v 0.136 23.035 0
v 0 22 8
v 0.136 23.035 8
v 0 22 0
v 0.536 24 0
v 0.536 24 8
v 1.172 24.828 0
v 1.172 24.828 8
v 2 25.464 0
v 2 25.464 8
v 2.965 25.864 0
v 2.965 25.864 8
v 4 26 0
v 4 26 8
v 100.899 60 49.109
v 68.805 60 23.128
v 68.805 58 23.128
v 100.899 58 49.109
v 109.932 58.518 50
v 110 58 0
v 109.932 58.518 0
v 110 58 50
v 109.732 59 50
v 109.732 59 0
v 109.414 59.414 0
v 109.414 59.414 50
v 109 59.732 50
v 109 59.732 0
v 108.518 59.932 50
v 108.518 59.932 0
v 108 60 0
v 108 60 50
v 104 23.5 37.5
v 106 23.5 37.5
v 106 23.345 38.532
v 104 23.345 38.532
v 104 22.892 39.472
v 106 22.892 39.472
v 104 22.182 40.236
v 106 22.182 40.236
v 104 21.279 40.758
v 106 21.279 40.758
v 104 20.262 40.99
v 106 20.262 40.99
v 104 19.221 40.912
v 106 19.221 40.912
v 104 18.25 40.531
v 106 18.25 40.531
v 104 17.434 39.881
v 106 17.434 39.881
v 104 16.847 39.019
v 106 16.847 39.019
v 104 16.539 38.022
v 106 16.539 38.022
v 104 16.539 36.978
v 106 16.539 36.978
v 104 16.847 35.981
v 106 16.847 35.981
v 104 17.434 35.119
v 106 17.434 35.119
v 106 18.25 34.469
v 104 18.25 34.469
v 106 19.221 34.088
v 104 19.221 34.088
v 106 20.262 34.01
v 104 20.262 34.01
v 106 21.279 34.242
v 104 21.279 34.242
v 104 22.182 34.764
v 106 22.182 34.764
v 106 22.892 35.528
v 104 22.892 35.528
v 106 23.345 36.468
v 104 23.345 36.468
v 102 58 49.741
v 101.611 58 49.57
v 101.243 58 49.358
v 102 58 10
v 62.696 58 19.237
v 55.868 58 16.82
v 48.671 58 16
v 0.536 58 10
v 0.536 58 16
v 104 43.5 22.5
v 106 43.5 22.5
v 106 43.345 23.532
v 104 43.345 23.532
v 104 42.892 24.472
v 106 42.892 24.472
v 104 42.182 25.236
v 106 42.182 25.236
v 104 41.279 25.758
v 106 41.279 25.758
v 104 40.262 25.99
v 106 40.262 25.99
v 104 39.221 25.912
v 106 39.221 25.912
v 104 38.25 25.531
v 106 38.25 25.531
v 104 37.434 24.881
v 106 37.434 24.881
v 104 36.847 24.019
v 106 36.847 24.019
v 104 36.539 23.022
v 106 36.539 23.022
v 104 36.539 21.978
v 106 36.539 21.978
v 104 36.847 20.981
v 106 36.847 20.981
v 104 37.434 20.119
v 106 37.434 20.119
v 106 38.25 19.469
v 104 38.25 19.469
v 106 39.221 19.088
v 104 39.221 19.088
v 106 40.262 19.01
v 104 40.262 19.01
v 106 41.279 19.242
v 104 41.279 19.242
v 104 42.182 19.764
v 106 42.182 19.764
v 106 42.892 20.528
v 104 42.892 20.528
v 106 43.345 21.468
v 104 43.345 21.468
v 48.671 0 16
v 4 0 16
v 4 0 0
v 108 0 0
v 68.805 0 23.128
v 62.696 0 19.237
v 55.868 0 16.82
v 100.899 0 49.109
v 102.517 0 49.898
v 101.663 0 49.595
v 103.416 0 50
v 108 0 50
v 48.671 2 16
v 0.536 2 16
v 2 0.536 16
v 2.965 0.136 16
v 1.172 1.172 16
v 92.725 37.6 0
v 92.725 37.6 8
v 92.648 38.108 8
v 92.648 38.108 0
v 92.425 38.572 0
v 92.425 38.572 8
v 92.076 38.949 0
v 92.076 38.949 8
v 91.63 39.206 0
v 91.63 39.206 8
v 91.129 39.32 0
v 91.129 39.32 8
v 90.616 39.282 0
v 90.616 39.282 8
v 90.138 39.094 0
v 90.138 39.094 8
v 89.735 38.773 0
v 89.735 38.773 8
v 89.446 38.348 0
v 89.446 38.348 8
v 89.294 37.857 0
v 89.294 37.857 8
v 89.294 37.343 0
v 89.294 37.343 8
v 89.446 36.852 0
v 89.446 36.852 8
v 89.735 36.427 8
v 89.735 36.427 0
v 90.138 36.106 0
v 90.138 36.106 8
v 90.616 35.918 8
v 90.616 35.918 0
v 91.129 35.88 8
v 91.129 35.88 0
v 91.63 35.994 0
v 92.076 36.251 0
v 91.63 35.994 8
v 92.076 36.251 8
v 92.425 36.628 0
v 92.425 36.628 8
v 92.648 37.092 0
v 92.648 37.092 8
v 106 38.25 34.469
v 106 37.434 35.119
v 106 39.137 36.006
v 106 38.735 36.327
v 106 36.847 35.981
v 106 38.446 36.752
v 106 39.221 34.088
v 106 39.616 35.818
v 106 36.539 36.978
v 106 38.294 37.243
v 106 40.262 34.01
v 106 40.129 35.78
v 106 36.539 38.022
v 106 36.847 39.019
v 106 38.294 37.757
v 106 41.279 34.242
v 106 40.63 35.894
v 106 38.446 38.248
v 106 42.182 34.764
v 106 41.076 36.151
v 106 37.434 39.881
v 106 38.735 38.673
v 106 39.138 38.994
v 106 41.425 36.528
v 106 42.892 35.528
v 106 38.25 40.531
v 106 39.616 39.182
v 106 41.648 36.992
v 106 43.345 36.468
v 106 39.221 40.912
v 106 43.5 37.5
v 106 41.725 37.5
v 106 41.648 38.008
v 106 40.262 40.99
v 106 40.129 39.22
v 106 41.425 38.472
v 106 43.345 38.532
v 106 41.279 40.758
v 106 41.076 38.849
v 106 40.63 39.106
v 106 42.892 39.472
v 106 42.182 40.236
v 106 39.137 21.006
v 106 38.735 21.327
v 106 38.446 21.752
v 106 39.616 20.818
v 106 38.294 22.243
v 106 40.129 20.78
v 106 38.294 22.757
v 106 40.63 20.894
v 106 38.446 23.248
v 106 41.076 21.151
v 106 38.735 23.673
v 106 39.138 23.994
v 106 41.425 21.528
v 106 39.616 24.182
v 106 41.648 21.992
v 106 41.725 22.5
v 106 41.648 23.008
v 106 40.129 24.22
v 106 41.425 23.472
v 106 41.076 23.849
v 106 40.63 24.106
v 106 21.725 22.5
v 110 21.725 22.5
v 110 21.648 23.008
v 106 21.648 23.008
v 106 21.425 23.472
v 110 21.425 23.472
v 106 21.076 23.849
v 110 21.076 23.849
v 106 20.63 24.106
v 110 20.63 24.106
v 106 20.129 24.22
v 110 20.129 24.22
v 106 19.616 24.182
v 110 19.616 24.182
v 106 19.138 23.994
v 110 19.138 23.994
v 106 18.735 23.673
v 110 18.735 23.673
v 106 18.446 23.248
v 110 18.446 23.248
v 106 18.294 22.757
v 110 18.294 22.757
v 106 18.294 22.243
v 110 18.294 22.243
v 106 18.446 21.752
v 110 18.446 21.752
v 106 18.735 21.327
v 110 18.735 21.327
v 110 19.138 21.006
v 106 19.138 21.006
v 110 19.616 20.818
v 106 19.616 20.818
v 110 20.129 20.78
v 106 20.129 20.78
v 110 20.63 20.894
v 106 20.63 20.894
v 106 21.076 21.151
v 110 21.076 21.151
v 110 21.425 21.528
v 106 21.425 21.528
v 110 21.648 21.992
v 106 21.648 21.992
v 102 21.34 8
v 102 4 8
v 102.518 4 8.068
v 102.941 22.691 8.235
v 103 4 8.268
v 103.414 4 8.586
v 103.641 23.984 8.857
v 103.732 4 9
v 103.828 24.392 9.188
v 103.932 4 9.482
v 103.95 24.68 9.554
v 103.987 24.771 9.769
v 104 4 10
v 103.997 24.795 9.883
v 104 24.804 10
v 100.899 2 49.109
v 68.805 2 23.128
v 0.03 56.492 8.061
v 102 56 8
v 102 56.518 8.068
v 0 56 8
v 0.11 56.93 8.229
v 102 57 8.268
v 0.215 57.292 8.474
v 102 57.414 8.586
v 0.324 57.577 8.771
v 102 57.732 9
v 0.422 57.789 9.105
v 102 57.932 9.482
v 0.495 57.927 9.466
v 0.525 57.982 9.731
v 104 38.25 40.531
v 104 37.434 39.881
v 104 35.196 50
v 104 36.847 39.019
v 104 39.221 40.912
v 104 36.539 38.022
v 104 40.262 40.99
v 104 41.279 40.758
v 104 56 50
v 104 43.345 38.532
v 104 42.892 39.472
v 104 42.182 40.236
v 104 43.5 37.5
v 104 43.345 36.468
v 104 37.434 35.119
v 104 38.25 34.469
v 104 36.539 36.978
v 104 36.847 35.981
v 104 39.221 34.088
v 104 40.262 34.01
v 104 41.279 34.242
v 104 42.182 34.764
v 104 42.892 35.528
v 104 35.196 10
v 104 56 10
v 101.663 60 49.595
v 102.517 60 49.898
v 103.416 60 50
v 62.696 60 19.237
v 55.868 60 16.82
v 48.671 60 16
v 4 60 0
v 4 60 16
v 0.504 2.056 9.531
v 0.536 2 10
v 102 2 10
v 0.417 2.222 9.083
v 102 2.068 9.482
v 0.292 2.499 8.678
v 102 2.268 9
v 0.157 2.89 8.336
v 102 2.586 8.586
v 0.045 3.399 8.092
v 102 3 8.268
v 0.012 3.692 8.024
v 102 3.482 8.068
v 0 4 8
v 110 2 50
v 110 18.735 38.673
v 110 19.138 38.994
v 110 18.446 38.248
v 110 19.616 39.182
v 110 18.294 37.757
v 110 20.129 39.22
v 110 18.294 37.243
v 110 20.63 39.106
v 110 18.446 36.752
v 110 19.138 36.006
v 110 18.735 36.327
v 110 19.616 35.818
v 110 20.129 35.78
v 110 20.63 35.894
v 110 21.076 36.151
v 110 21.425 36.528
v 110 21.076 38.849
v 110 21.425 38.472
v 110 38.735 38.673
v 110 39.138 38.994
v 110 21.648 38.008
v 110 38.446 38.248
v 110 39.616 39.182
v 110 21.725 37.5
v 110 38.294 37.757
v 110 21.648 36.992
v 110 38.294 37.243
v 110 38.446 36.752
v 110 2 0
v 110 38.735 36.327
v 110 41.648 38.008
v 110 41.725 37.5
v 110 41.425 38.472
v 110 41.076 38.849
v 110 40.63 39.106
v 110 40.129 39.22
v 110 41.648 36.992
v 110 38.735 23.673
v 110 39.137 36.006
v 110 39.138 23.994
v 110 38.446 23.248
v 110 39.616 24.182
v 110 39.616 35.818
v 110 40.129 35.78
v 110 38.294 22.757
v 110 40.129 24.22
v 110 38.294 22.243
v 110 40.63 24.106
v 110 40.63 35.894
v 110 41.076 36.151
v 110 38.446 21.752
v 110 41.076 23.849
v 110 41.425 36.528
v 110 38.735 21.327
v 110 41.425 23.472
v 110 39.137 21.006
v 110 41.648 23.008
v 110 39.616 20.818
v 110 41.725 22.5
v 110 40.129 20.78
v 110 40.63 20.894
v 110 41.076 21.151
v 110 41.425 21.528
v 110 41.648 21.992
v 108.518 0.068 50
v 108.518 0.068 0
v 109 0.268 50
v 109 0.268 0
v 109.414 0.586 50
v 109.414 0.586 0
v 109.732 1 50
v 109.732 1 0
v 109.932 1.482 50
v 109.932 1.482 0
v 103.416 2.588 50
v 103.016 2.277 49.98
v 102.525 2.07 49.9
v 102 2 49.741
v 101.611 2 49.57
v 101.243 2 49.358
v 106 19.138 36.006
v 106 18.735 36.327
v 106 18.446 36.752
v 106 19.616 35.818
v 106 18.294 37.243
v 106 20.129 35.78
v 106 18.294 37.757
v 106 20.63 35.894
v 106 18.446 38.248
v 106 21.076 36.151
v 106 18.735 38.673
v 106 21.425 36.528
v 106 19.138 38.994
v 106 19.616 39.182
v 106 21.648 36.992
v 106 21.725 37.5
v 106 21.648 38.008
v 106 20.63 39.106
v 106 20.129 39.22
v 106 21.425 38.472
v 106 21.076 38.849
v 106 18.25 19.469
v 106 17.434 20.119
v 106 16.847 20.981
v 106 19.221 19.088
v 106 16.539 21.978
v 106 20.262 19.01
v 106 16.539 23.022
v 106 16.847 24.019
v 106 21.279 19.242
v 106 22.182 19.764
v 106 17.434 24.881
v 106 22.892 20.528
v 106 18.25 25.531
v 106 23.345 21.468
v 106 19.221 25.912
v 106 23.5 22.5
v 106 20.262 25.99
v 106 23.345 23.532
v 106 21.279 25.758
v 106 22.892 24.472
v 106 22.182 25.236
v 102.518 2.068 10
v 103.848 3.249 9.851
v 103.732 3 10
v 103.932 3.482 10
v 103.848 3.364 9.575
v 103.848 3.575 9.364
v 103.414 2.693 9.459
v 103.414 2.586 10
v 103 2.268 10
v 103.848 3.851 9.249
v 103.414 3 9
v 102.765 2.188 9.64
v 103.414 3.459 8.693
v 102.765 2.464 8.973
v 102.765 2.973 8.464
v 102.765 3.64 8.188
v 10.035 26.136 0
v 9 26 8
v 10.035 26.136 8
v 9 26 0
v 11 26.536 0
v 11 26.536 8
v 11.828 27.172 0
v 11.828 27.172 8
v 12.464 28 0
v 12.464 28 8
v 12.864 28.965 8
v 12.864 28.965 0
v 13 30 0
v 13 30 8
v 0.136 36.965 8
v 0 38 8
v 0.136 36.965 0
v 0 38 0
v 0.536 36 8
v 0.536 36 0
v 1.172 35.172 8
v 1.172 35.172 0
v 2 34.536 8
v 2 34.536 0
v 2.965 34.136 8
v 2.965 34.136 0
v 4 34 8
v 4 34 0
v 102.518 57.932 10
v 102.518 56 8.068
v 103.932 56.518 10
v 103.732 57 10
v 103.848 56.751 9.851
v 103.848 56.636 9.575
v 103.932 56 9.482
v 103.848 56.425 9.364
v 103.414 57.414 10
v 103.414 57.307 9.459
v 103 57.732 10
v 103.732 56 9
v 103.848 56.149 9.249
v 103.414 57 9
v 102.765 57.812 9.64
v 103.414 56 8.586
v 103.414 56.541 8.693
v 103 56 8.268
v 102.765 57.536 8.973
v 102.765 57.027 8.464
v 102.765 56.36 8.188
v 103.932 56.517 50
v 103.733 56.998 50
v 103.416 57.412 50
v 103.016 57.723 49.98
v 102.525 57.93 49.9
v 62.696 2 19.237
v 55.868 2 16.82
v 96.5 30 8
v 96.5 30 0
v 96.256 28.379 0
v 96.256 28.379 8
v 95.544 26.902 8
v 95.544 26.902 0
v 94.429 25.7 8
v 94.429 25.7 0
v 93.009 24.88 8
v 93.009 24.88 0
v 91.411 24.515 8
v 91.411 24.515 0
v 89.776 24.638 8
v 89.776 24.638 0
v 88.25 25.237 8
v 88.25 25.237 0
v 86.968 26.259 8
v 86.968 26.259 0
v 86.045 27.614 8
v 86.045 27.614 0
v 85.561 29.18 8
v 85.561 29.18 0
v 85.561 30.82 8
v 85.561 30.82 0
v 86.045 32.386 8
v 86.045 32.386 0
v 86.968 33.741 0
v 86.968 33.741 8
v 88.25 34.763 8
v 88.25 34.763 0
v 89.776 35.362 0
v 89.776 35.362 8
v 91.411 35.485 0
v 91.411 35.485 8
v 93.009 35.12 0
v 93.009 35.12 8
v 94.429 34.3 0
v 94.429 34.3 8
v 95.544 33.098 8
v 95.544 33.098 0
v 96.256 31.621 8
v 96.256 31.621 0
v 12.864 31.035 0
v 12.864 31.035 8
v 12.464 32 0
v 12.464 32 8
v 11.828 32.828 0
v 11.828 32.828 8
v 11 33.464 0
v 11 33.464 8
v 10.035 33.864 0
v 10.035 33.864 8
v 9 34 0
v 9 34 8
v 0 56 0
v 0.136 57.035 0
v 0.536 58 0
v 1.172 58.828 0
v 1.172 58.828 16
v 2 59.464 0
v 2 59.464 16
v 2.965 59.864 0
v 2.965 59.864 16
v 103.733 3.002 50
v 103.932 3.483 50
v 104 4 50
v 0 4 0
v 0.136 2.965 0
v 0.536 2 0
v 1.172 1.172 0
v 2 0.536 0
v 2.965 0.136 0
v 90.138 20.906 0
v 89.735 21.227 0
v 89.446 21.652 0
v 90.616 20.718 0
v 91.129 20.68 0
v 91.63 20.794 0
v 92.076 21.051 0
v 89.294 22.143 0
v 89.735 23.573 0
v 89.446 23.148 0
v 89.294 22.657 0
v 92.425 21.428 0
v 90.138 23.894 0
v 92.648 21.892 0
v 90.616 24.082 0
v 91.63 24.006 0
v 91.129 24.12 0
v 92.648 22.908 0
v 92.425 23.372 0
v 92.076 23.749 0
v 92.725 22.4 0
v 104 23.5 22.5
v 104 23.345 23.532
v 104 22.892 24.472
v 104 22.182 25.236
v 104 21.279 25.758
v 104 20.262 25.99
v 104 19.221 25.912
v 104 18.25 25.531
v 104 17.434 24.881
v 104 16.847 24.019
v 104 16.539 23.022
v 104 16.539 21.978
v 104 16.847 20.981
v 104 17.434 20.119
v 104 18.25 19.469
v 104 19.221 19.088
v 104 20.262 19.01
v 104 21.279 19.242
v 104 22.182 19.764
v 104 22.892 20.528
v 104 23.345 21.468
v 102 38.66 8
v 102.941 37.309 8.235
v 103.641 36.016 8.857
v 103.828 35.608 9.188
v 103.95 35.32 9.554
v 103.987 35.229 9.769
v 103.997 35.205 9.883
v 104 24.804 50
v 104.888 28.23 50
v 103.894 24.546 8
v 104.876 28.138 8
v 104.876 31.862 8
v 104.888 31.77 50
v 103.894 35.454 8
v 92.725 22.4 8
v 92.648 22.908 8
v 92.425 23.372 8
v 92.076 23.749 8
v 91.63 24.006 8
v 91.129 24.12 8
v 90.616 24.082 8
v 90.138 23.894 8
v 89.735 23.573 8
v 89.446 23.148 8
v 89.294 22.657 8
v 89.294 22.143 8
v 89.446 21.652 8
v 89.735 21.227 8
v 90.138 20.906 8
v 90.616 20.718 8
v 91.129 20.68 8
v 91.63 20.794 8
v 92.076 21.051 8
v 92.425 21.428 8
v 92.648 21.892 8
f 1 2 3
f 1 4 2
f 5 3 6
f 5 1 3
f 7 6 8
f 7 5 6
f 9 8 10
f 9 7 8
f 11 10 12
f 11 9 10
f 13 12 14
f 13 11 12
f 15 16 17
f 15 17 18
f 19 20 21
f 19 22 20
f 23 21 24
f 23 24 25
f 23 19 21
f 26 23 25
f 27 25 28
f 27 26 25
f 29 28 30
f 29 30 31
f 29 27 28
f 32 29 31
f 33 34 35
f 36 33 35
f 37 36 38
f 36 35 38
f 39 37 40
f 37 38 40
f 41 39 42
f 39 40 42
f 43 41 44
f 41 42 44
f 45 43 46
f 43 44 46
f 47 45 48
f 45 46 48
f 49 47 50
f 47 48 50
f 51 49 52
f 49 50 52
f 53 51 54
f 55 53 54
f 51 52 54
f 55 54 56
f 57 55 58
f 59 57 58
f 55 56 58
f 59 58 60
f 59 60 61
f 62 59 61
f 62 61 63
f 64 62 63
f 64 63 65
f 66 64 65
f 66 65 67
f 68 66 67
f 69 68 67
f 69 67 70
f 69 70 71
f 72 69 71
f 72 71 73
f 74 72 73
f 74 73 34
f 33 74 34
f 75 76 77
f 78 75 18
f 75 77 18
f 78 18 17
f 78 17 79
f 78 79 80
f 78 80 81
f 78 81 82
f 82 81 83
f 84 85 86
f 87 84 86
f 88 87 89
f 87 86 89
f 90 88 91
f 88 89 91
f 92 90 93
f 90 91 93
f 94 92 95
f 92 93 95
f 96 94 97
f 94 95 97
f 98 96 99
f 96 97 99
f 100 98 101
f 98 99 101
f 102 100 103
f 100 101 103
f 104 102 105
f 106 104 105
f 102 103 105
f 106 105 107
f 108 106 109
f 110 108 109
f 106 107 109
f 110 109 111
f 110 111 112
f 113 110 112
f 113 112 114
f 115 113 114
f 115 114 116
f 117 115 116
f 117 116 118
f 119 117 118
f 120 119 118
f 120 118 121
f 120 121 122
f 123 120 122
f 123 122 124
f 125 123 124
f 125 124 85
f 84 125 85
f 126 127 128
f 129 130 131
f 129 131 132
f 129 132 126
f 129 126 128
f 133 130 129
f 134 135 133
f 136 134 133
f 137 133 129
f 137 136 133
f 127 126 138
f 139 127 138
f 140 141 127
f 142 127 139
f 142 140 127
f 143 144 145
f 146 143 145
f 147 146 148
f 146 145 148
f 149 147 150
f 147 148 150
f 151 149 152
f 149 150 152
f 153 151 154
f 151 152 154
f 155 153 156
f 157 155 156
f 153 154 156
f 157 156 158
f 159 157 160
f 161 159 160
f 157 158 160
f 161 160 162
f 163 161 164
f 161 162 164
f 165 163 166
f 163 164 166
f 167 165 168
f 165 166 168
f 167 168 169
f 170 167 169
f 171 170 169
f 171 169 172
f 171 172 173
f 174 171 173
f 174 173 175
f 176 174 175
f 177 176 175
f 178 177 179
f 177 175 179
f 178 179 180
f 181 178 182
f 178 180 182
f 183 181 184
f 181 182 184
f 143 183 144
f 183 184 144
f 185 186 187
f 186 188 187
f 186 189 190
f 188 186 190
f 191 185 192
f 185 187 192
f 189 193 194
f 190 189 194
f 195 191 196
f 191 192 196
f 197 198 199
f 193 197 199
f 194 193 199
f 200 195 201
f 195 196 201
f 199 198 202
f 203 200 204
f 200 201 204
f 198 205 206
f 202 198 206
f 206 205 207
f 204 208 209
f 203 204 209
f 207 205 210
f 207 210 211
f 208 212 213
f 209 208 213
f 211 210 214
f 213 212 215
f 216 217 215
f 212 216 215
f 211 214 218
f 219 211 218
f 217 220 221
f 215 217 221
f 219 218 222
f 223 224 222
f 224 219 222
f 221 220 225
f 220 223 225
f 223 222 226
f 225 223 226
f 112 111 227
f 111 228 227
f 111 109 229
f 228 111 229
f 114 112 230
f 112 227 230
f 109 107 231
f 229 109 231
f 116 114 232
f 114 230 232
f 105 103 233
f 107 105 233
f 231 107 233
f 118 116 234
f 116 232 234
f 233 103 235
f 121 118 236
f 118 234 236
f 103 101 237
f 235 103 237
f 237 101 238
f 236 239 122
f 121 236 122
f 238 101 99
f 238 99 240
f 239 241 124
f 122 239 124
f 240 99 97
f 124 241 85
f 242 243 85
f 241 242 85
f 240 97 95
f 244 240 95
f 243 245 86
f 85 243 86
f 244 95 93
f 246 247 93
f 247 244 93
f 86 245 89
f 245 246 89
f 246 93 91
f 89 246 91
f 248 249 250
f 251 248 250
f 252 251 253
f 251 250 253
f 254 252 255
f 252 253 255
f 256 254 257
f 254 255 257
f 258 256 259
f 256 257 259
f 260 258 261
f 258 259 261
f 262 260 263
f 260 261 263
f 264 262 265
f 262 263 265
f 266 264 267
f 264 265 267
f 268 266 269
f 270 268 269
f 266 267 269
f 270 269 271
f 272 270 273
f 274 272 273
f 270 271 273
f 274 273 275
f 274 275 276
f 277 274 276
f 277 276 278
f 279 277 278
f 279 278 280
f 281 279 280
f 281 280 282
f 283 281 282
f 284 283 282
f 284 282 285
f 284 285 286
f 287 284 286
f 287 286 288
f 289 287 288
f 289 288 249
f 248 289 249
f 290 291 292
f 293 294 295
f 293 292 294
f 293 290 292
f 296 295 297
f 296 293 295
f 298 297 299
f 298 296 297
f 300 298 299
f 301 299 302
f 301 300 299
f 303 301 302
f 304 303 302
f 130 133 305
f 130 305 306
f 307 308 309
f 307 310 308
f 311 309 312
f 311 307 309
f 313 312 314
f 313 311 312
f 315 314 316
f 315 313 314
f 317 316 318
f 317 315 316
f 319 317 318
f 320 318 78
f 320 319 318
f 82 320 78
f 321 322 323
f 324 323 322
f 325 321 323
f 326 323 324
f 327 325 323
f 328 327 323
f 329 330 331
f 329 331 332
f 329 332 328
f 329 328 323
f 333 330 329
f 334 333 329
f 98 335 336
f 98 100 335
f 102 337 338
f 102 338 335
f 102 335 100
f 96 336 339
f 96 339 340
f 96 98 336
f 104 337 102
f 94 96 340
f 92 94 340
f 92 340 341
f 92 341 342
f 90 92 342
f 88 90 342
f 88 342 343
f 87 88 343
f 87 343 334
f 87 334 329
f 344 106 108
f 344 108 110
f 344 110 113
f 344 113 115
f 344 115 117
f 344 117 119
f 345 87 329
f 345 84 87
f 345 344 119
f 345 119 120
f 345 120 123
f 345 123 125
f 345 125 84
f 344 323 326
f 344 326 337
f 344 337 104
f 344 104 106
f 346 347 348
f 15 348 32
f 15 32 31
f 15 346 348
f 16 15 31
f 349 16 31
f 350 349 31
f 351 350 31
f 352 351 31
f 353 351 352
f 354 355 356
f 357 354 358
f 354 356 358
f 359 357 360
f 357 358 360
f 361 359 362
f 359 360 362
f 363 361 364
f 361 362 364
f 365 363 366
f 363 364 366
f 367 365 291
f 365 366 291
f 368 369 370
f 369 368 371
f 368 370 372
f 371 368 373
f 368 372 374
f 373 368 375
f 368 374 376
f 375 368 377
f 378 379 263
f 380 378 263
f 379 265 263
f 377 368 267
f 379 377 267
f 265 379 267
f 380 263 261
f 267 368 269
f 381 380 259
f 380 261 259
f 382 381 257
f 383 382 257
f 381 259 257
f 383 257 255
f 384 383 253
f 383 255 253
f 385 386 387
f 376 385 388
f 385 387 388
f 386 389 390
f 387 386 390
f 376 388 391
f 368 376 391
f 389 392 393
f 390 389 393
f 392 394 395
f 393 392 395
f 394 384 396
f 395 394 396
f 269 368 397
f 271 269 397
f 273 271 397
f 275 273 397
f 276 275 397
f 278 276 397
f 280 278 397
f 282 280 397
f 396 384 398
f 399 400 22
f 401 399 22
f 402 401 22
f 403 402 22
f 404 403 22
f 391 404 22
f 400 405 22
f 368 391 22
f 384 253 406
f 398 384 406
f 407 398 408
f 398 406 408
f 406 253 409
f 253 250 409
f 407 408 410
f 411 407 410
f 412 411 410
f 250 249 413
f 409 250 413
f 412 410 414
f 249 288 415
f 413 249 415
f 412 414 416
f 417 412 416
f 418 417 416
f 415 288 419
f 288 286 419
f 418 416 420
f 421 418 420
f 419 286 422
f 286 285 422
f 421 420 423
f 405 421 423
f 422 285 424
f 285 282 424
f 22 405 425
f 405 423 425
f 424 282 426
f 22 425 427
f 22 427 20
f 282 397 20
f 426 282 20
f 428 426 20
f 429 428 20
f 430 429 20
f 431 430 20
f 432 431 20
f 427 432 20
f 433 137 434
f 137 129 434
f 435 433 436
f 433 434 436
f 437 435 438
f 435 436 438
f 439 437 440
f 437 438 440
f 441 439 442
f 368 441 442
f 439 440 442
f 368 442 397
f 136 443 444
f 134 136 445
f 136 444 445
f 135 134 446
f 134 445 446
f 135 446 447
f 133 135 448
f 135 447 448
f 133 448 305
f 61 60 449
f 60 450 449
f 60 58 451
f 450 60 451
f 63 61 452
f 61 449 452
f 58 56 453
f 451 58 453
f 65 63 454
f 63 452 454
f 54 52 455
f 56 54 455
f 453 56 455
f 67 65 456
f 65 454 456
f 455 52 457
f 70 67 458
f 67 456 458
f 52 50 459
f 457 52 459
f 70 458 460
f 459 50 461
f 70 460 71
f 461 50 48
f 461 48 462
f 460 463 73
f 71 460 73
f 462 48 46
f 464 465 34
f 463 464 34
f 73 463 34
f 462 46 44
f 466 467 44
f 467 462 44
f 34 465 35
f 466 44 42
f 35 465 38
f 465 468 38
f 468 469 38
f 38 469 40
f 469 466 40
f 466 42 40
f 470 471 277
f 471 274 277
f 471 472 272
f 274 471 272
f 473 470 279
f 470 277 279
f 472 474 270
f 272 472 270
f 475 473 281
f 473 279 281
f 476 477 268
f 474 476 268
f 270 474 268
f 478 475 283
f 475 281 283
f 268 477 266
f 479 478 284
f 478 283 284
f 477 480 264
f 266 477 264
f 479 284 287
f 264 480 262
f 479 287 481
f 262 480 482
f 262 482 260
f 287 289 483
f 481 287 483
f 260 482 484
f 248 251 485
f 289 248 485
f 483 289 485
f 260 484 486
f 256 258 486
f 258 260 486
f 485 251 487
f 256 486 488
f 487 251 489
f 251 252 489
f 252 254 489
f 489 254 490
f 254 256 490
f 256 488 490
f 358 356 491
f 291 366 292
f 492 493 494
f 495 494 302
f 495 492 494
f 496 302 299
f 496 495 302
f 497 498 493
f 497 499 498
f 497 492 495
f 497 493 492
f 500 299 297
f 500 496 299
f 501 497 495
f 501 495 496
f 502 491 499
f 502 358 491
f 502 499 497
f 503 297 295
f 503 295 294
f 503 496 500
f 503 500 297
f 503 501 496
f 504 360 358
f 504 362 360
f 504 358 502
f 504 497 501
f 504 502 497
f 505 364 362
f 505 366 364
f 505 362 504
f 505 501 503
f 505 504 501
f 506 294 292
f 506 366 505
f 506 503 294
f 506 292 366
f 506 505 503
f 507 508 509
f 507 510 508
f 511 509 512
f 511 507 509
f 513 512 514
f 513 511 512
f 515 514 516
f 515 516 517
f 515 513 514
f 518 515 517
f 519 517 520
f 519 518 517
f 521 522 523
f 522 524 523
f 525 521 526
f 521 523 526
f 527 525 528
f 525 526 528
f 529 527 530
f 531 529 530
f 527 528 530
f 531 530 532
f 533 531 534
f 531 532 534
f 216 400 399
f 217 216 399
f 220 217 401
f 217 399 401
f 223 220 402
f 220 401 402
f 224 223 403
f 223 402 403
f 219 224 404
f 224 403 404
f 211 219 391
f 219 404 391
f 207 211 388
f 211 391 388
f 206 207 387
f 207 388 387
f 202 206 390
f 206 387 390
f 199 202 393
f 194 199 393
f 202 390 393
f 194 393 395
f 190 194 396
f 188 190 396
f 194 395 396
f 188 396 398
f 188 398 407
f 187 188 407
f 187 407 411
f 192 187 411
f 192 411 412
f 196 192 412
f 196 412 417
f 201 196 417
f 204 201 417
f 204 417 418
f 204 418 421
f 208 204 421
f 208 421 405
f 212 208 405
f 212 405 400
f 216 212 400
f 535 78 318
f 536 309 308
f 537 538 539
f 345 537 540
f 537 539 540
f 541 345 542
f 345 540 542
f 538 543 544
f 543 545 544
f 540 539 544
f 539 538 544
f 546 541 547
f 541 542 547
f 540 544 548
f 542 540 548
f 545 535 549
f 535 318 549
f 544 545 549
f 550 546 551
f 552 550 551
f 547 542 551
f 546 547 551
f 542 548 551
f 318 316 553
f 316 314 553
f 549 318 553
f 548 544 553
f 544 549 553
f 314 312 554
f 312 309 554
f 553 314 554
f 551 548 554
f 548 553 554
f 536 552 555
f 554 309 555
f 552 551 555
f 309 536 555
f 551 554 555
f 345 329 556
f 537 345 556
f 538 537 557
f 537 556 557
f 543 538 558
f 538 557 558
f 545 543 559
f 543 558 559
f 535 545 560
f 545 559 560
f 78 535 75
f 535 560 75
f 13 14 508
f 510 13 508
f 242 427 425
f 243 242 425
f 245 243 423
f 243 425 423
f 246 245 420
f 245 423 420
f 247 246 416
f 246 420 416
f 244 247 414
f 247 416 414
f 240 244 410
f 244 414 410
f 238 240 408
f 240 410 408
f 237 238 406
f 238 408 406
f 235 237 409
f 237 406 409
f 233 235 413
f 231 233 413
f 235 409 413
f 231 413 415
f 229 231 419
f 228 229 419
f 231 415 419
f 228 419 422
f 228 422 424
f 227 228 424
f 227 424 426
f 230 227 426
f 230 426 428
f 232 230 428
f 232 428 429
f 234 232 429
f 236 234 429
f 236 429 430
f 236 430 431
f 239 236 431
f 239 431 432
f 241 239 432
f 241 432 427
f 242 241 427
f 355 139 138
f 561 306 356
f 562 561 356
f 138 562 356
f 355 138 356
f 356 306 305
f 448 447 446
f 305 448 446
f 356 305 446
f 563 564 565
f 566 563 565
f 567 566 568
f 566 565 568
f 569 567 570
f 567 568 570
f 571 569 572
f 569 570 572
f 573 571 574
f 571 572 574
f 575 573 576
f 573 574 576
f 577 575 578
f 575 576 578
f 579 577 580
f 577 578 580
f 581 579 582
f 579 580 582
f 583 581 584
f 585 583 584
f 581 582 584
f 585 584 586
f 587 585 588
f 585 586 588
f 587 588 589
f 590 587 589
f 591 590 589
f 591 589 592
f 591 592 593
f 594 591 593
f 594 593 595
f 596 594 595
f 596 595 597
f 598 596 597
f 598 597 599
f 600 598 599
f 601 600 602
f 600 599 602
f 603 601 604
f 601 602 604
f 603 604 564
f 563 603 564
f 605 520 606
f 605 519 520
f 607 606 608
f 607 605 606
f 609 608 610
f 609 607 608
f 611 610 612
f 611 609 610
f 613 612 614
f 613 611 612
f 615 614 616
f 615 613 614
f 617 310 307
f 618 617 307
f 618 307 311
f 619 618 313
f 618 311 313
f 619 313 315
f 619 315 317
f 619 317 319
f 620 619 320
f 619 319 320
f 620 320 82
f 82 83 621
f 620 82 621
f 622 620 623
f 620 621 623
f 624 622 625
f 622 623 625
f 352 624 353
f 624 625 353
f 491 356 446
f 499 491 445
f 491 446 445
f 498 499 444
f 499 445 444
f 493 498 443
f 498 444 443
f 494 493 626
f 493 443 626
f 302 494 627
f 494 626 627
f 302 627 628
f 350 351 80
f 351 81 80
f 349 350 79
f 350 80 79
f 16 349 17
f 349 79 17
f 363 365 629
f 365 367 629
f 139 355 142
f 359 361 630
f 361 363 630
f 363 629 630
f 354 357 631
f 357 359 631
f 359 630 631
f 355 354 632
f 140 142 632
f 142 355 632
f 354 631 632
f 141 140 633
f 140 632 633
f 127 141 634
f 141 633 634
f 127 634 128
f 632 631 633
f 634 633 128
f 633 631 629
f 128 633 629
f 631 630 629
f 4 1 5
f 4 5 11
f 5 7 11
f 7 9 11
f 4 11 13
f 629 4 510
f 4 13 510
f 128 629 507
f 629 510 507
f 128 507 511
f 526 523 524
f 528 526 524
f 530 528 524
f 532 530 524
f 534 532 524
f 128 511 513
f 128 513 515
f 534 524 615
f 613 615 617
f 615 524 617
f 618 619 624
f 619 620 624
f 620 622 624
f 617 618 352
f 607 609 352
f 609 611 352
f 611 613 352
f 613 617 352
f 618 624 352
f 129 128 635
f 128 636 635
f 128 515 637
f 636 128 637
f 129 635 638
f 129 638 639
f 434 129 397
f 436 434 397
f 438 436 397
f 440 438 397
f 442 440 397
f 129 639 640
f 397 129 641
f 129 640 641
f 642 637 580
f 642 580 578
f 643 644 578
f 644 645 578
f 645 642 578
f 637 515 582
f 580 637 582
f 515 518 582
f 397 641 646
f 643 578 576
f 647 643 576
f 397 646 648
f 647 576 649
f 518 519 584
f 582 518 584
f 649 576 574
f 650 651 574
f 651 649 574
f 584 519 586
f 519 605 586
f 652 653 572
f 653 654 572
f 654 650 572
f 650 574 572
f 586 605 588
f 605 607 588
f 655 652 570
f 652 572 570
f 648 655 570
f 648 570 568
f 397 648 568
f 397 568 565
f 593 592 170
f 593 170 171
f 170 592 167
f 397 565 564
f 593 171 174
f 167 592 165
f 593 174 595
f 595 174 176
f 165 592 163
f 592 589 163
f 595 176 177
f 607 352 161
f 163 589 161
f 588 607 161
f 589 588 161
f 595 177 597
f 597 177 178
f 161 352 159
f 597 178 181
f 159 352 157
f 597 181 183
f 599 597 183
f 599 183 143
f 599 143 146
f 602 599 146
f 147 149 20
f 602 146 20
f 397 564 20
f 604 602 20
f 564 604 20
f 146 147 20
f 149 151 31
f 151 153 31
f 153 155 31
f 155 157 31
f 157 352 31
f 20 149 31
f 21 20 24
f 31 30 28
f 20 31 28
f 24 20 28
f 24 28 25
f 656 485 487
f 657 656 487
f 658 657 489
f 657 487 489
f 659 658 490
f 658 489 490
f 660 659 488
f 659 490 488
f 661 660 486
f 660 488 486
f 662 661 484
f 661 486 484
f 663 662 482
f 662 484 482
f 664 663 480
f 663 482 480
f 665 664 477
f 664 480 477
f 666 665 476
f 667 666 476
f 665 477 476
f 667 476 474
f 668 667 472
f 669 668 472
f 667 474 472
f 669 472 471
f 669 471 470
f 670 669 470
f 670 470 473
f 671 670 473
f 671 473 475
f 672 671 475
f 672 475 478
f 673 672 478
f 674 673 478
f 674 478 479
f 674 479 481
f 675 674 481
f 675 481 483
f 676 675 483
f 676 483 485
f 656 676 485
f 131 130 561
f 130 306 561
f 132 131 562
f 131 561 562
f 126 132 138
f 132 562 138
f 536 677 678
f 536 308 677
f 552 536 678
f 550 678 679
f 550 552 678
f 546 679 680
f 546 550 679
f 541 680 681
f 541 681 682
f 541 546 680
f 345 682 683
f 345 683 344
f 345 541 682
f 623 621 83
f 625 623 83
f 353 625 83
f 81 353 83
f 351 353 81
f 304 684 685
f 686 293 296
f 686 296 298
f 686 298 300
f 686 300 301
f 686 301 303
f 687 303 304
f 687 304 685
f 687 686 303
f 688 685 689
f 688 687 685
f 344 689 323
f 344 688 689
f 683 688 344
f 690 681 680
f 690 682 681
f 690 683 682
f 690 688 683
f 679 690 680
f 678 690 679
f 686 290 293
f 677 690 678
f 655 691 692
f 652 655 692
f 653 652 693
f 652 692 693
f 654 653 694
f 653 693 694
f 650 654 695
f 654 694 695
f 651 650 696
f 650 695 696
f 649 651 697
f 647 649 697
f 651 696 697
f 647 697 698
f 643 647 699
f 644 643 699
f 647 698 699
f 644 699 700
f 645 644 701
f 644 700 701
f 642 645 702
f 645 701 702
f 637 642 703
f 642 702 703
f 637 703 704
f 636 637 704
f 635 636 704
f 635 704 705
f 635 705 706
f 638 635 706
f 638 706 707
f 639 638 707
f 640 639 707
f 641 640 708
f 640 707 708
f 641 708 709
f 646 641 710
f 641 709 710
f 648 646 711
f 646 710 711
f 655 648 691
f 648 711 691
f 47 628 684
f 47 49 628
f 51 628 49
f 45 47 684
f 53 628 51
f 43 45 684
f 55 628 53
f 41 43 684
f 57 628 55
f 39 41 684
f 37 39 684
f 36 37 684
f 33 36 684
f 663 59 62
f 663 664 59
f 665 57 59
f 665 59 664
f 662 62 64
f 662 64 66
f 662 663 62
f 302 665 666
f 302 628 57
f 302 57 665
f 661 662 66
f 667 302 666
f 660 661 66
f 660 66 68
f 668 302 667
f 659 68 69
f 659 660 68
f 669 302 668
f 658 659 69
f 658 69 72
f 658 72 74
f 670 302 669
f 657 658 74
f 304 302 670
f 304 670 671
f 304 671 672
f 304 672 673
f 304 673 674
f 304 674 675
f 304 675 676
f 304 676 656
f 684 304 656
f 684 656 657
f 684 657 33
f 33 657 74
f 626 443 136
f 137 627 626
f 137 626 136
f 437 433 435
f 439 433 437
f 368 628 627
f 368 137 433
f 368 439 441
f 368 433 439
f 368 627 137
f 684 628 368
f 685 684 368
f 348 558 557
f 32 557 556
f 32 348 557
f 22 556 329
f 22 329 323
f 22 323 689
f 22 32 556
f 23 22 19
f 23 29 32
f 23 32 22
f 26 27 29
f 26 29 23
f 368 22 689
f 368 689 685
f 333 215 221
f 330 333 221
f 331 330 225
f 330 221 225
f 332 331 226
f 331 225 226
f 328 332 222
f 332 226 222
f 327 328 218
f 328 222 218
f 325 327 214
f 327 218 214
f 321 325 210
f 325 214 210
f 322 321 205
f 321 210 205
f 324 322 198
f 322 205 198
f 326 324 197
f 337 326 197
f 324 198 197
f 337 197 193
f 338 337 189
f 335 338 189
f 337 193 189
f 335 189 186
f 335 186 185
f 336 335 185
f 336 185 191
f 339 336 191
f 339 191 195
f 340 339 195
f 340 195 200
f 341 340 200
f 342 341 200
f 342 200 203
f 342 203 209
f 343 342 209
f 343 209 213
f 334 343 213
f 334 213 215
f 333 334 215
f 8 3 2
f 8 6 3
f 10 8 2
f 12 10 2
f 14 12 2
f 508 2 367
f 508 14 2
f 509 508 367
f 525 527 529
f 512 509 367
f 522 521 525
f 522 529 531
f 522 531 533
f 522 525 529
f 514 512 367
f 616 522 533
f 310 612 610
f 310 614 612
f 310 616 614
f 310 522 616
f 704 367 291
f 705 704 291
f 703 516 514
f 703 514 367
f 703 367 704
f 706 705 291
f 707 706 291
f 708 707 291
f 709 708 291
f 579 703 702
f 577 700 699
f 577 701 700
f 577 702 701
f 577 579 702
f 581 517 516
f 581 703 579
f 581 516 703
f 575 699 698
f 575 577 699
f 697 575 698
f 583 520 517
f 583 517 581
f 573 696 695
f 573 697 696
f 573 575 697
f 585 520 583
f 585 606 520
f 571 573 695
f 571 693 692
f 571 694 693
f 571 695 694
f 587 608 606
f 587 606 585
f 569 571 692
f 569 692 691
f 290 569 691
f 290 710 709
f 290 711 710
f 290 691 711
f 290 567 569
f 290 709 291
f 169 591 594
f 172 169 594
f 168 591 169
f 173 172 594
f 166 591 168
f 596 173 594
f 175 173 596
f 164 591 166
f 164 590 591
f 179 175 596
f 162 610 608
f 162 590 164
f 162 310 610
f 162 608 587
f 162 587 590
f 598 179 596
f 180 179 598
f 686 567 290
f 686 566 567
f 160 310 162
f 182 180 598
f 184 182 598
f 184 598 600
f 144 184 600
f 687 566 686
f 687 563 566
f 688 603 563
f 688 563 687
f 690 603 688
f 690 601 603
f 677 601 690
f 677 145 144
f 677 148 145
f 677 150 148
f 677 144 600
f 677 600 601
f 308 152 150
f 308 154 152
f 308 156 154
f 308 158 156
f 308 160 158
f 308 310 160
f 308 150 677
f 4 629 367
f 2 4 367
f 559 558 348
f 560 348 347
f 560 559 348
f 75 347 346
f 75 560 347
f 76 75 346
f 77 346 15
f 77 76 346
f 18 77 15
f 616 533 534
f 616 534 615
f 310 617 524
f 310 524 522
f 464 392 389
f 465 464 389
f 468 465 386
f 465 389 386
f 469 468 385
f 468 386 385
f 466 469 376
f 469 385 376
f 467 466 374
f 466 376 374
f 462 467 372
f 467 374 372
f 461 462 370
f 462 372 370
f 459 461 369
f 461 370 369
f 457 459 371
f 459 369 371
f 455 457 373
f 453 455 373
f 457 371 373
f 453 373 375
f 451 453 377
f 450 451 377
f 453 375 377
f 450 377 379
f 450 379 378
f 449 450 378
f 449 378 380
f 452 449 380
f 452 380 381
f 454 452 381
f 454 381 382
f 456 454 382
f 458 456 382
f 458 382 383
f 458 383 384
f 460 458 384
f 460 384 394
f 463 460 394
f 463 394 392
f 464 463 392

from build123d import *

# Parameters (mm, degrees)
F0_W      = 110
F0_H      = 60
F1_DEPTH  = 8
F3_DEPTH  = 2
F5_DEPTH  = 2
F6_W      = 6
F6_H      = 56
F7_DEPTH  = 42
F8_W      = 13
F8_H      = 8
F9_DEPTH  = 8
F10_R     = 3.99999
F11_R     = 2
F12_R     = 1.725
F13_DEPTH = 6
F12_R_2   = 3.5
F14_DEPTH = 3
F17_R     = 5.5
F18_DEPTH = 8
F19_R     = 1.725
F20_DEPTH = 8
F19_R_2   = 14
F21_DEPTH = 55
F22_R     = 32


# Not quite as in the source:
# - a fillet or chamfer is up to 0.001 mm smaller than in the source, because OpenCascade refuses the exact size


with BuildPart() as f1:
    # F0 (on Top) → F1 (new body)
    with BuildSketch(Plane.XY):
        with Locations((55, 30)):
            Rectangle(F0_W, F0_H)
    extrude(amount=F1_DEPTH)

    # F2 (on face) → F3 (join)
    with BuildSketch(Plane.XZ):
        Polygon((0, 8), (110, 8), (110, 50), (102, 50), (60, 16), (0, 16), align=None)
    extrude(amount=-F3_DEPTH)

    # F4 (on face) → F5 (join)
    with BuildSketch(Plane(origin=(0, 60, 0), x_dir=(-1, 0, 0), z_dir=(0, 1, 0))):
        Polygon((-110, 50), (-110, 8), (0, 8), (0, 16), (-60, 16), (-102, 50), align=None)
    extrude(amount=-F5_DEPTH)

    # F6 (on face) → F7 (join)
    with BuildSketch(Plane.XY.offset(8)):
        with Locations((107, 30)):
            Rectangle(F6_W, F6_H)
    extrude(amount=F7_DEPTH)

    # F8 (on face) → F9 (cut)
    with BuildSketch(Plane.XY.offset(8)):
        with Locations((6.5, 30)):
            Rectangle(F8_W, F8_H)
    extrude(amount=-F9_DEPTH, mode=Mode.SUBTRACT)

    # F10 (radius 4 in the source; OpenCascade refuses exactly that, so slightly less here)
    f10_edges = [f1.edges().sort_by_distance(p)[0] for p in [
        (102, 59, 50),
        (102, 1, 50),
        (0, 60, 8),
        (0, 34, 4),
        (0, 26, 4),
        (13, 26, 4),
        (13, 34, 4),
        (0, 0, 8),
    ]]
    fillet(f10_edges, radius=F10_R)

    # F11
    f11_edges = [f1.edges().sort_by_distance(p)[0] for p in [
        (52.267947, 58, 8),
        (52.267947, 2, 8),
        (110, 0, 25),
        (110, 60, 25),
        (104, 2, 29),
        (104, 58, 29),
        (104, 30, 8),
    ]]
    fillet(f11_edges, radius=F11_R)

    # F12 (on face) → F13 (cut)
    with BuildSketch(Plane.YZ.offset(110)):
        with Locations((20, 37.5)):
            Circle(F12_R)
        with Locations((40, 22.5)):
            Circle(F12_R)
        with Locations((20, 22.5)):
            Circle(F12_R)
        with Locations((40, 37.5)):
            Circle(F12_R)
    extrude(amount=-F13_DEPTH, mode=Mode.SUBTRACT)


with BuildPart() as f14:
    # F12 (on face) → F14 (new body)
    with BuildSketch(Plane.YZ.offset(110)):
        with Locations((20, 22.5)):
            Circle(F12_R_2)
        with Locations((20, 22.5)):
            Circle(F12_R, mode=Mode.SUBTRACT)
    extrude(amount=-F14_DEPTH)


with BuildPart() as f14b:
    # F12 (on face) → F14, piece 2 (new body)
    with BuildSketch(Plane.YZ.offset(110)):
        with Locations((40, 22.5)):
            Circle(F12_R_2)
        with Locations((40, 22.5)):
            Circle(F12_R, mode=Mode.SUBTRACT)
    extrude(amount=-F14_DEPTH)


with BuildPart() as f14c:
    # F12 (on face) → F14, piece 3 (new body)
    with BuildSketch(Plane.YZ.offset(110)):
        with Locations((40, 37.5)):
            Circle(F12_R_2)
        with Locations((40, 37.5)):
            Circle(F12_R, mode=Mode.SUBTRACT)
    extrude(amount=-F14_DEPTH)


with BuildPart() as f14d:
    # F12 (on face) → F14, piece 4 (new body)
    with BuildSketch(Plane.YZ.offset(110)):
        with Locations((20, 37.5)):
            Circle(F12_R_2)
        with Locations((20, 37.5)):
            Circle(F12_R, mode=Mode.SUBTRACT)
    extrude(amount=-F14_DEPTH)


with BuildPart() as f14d_1:
    # F15: moved
    add(f14d.part.moved(Location((-4, 0, 0))))


with BuildPart() as f14c_1:
    # F15: moved
    add(f14c.part.moved(Location((-4, 0, 0))))


with BuildPart() as f14b_1:
    # F15: moved
    add(f14b.part.moved(Location((-4, 0, 0))))


with BuildPart() as f14_1:
    # F15: moved
    add(f14.part.moved(Location((-4, 0, 0))))


with BuildPart() as f1_1:
    add(f1.part)

    # F16: cut F14d, F14c, F14b, F14
    add(f14d_1.part, mode=Mode.SUBTRACT)
    add(f14c_1.part, mode=Mode.SUBTRACT)
    add(f14b_1.part, mode=Mode.SUBTRACT)
    add(f14_1.part, mode=Mode.SUBTRACT)

    # F17 (on face) → F18 (cut)
    with BuildSketch(Plane(origin=(0, 0, 0), x_dir=(1, 0, 0), z_dir=(0, 0, -1))):
        with Locations((91, -30)):
            Circle(F17_R)
    extrude(amount=-F18_DEPTH, mode=Mode.SUBTRACT)

    # F19 (on face) → F20 (cut)
    with BuildSketch(Plane.XY.offset(8)):
        with Locations((91, 37.6)):
            Circle(F19_R)
        with Locations((91, 22.4)):
            Circle(F19_R)
    extrude(amount=-F20_DEPTH, mode=Mode.SUBTRACT)

    # F19 (on face) → F21 (cut)
    with BuildSketch(Plane.XY.offset(8)):
        with Locations((91, 30)):
            Circle(F19_R_2)
        with Locations((91, 22.4)):
            Circle(F19_R, mode=Mode.SUBTRACT)
        with Locations((83.4, 30)):
            Circle(F19_R, mode=Mode.SUBTRACT)
        with Locations((91, 37.6)):
            Circle(F19_R, mode=Mode.SUBTRACT)
        with Locations((98.6, 30)):
            Circle(F19_R, mode=Mode.SUBTRACT)
        with Locations((-18, 77.4)):
            Circle(F19_R)
        with Locations((-77.4, -18)):
            Circle(F19_R)
        with Locations((18, -77.4)):
            Circle(F19_R)
        with Locations((98.6, 30)):
            Circle(F19_R)
    extrude(amount=F21_DEPTH, mode=Mode.SUBTRACT)

    # F22
    f22_edges = [f1_1.edges().sort_by_distance(p)[0] for p in [
        (60, 59, 16),
        (60, 1, 16),
    ]]
    fillet(f22_edges, radius=F22_R)


solid = f1_1.part
